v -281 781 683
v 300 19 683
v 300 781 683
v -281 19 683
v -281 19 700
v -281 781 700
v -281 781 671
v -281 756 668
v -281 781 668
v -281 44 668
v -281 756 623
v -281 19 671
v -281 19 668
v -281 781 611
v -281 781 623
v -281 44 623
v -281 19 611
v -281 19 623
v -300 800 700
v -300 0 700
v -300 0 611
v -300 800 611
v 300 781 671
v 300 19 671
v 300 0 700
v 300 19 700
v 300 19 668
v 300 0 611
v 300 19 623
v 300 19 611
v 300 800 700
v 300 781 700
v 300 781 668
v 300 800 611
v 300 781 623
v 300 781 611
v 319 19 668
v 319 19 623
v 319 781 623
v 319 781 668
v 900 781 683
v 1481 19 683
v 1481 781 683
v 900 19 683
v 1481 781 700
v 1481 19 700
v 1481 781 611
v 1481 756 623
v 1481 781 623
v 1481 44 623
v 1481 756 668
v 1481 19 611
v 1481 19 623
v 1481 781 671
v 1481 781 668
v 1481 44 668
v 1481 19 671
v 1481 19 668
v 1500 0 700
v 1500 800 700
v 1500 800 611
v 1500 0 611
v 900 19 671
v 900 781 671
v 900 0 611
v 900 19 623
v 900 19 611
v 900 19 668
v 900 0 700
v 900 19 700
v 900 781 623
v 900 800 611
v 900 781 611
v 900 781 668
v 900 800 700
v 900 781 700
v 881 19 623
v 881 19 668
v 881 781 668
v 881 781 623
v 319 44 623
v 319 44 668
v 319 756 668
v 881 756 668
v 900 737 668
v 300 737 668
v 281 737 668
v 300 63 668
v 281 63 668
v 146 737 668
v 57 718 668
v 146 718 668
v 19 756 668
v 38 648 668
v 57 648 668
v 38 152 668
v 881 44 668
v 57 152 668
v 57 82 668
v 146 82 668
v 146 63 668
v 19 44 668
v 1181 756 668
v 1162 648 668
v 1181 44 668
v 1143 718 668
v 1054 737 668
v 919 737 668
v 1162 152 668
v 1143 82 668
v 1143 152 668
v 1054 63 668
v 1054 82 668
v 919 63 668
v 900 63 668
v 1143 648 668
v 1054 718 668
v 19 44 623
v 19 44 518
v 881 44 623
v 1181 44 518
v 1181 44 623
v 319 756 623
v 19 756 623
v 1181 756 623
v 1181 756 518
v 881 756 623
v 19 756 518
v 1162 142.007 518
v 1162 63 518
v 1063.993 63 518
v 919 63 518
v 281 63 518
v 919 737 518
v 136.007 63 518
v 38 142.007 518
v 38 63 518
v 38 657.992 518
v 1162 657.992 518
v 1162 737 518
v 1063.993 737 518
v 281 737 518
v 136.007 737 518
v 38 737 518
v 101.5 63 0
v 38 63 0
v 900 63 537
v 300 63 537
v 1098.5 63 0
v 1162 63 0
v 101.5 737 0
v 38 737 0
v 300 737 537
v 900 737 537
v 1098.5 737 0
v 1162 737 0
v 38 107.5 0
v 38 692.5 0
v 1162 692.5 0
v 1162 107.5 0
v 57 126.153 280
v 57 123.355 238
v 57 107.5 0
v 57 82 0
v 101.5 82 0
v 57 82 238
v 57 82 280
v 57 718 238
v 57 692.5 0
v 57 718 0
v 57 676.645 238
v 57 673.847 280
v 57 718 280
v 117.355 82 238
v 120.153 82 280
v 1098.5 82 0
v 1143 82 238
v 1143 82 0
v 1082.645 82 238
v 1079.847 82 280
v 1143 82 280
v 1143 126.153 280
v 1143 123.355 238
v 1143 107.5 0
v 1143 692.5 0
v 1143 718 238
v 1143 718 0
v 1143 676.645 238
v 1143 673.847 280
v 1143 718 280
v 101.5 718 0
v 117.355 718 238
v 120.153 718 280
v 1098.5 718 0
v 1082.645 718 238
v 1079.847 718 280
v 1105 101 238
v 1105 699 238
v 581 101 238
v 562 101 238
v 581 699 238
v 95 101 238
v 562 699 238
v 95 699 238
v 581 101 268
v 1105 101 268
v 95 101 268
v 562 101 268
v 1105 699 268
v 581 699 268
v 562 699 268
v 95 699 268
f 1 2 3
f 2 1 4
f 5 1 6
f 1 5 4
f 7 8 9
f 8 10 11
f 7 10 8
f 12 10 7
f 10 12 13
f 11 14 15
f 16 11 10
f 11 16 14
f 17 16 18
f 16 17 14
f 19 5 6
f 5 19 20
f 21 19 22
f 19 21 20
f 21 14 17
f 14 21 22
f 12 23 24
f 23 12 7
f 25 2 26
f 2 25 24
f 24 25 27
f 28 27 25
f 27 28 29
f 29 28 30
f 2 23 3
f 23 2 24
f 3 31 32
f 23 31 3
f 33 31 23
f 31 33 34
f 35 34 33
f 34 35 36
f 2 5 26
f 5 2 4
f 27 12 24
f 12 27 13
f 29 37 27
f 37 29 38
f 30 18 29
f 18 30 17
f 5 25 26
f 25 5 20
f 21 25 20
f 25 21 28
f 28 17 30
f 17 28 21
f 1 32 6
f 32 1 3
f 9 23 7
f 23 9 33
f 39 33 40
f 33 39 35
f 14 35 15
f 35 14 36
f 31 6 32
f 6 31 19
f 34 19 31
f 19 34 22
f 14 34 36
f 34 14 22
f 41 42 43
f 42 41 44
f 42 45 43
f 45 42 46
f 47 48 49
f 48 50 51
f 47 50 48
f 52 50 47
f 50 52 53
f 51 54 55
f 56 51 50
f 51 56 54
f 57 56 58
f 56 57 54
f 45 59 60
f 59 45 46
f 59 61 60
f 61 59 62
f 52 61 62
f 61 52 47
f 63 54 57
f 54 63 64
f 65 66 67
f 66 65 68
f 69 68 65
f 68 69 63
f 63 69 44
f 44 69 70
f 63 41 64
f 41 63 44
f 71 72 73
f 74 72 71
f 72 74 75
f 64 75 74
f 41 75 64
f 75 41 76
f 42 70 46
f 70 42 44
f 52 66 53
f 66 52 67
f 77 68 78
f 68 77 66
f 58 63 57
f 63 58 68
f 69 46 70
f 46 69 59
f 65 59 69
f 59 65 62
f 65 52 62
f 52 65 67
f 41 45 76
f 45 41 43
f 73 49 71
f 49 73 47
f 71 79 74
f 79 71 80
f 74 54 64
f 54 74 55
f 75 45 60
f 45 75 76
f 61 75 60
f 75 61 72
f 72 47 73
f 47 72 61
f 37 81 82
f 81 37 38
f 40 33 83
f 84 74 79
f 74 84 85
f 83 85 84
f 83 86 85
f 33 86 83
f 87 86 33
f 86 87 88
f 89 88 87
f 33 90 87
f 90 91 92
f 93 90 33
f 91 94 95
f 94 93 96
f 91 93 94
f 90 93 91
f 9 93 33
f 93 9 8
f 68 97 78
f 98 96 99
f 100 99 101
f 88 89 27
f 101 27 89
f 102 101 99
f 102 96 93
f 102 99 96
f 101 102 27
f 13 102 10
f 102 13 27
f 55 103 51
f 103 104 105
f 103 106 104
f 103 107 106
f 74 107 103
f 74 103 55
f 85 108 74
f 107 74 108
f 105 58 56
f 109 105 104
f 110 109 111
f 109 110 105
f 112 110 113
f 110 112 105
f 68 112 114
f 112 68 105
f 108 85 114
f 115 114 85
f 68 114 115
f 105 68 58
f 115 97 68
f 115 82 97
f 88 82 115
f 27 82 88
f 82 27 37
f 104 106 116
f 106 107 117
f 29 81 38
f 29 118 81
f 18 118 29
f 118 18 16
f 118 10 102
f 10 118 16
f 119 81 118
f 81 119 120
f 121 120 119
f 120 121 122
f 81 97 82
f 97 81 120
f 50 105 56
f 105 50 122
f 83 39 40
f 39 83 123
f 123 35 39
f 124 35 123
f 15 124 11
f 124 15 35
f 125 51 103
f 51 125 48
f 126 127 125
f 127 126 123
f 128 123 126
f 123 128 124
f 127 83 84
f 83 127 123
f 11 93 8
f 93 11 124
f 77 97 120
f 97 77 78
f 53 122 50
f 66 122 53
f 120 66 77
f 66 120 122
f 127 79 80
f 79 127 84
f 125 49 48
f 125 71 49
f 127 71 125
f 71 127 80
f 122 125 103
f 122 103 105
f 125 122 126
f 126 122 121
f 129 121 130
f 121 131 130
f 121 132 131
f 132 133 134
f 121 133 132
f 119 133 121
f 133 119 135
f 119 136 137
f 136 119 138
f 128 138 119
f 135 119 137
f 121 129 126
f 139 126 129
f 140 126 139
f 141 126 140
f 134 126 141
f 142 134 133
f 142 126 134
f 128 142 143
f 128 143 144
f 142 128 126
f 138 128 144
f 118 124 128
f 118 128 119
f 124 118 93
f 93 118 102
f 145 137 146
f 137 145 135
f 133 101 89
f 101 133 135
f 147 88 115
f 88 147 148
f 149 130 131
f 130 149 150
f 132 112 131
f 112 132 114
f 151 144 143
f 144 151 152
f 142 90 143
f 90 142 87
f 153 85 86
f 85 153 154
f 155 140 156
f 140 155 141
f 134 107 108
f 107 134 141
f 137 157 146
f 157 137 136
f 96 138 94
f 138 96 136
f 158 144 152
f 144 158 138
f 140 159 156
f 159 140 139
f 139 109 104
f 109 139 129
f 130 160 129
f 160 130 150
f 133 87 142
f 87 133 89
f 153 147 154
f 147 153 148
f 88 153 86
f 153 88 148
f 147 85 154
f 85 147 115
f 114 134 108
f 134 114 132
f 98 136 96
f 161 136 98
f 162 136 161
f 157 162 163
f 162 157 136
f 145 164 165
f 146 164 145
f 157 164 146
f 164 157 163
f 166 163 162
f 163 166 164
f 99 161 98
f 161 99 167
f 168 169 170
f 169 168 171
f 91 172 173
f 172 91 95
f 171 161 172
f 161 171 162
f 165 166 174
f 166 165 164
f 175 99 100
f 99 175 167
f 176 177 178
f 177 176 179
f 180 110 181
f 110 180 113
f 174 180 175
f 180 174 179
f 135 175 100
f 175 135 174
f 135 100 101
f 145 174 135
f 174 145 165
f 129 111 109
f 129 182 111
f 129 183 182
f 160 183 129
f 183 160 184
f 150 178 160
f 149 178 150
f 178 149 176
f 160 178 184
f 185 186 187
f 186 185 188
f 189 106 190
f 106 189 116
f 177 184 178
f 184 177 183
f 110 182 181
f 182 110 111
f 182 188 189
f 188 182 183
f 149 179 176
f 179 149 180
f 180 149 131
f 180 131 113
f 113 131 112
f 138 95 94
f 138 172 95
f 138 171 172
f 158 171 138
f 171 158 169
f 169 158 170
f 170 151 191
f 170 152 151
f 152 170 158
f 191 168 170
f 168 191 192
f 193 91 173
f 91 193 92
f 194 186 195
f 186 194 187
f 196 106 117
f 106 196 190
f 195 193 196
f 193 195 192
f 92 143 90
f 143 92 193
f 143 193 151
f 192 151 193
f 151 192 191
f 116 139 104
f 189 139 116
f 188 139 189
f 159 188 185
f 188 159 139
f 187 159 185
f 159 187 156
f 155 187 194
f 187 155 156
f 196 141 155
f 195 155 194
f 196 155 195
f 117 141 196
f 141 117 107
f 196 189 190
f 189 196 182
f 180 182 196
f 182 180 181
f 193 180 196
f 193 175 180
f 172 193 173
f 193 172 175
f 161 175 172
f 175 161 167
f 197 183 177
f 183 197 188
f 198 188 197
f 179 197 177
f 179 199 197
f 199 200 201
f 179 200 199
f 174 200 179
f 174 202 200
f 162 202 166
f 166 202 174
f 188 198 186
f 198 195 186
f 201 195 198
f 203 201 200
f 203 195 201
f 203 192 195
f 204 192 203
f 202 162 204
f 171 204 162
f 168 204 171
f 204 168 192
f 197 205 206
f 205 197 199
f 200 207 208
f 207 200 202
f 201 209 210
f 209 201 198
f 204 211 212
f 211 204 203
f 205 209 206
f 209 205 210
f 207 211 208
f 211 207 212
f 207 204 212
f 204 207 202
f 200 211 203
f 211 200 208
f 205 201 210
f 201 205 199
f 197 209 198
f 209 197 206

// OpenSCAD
overallWidth = 800;
overallLength =  1200;
overallHeight = 700;

legWidth = 89;
legThickness = 19;

tableHeight = 89;
tableEdge = 19;

tableSurfaceThickness = 12;

tableDadoDepth = 4;
tableSurfaceOffset = 60;

slideCurrentExtension = 500;
slideMaxExtension = 300;
slideGap = 3;
slideLength = 300;
slideWidth = 45;
slideThickness = 25;


wellDepth = 150;
wellThickness = 19;

shelfThickness = 12;
shelfDepth = 42;
shelfSupportThickness = 19;

includeBottomShelf = false;

assembly();

module assembly() {
    addHeader();
    
    translate([0,0,overallHeight - tableHeight]) {
        table();
    }
    
    // Well
    wellOffset = overallHeight - tableHeight - wellDepth + tableSurfaceOffset - slideGap;
    
    translate([tableEdge, tableEdge + slideThickness, wellOffset]) {
        well();
    }
    
    // Front Left
    translate([tableEdge+wellThickness,tableEdge + slideThickness+wellThickness,0]) {
        mirror([0,0,0]) {
            rotate([0,0,0]) {
                leg();
            }
        }
    }
    
    // Front Right
    translate([overallLength-(tableEdge+wellThickness),tableEdge + slideThickness+wellThickness,0]) {
        mirror([1,0,0]){
            rotate([0,0,0]) {
                leg();
            }
        }
    }
    
    // Rear Left
    translate([tableEdge+wellThickness,overallWidth-(tableEdge + slideThickness+wellThickness),0]) {
        mirror([1,0,0]) {
            rotate([0,0,180]) {
                leg();
            }
        }
    }
    
    // Rear Right
    translate([overallLength-(tableEdge+wellThickness),overallWidth-(tableEdge + slideThickness+wellThickness),0]) {
        mirror([0,0,0]){
            rotate([0,0,180]) {
                leg();
            }
        }
    }
    
    // Common offset for shelf placement
    translate([tableEdge + wellThickness+legThickness, tableEdge + slideThickness + wellThickness + legThickness, 0]) {
        if(includeBottomShelf) {
            // Bottom Shelf
            shelf();
            
            // middle Shelf
            shelfOffset = (wellOffset -  shelfDepth) / 2;
            translate([0,0,wellOffset/2]) {
                shelf();
            }
        }
        else {
            // Shelf
            translate([0,0, (wellOffset -  shelfDepth) / 2]) {
                shelf();
            }
        }
    }
}
module table() {
    
    pos = max(0, min(slideMaxExtension, slideCurrentExtension));
    
    // Left Surface
    translate([-pos, 0, 0]) {
        tableLeft();
    }
    
    // Right Surface
    translate([overallLength/2 + pos, 0, 0]) {
        tableRight();
    }
    
    translate([tableEdge,tableEdge,tableSurfaceOffset - slideWidth - slideGap]) {
        slide(pos);
    }
    
    translate([tableEdge,overallWidth-tableEdge-slideThickness,tableSurfaceOffset - slideWidth - slideGap]) {
        slide(pos);
    }
    
    
    
    
    translate([(overallLength - tableEdge),tableEdge,tableSurfaceOffset - slideGap]) {
        rotate([0,180,0])
        slide(pos);
    }
    
    translate([(overallLength - tableEdge),overallWidth-tableEdge-slideThickness,tableSurfaceOffset - slideGap]) {
        rotate([0,180,0])
        slide(pos);
    }

}
module shelf() {
    shelfWidth = overallWidth - 2*tableEdge-2*slideThickness-2*wellThickness-2*legThickness;
    shelfLength = overallLength - 2*tableEdge-2*wellThickness-2*legThickness;
    
    shelfInnerWidth = shelfWidth - 2*shelfSupportThickness;
    
    // Front
    translate([0, 0, 0]) {
        addPart("Shelf Edge", shelfLength, shelfDepth, shelfSupportThickness);
        cube([shelfLength, shelfSupportThickness, shelfDepth]);
    }
    
    // Back
    translate([0,shelfWidth - shelfSupportThickness,0]) {
        addPart("Shelf Edge", shelfLength, shelfDepth, shelfSupportThickness);
        cube([shelfLength, shelfSupportThickness, shelfDepth]);
    }
    
    // Outer Left
    translate([shelfSupportThickness, shelfSupportThickness,0]) {
        rotate([0, 0, 90]) {
            addPart("Shelf Edge", shelfInnerWidth, shelfDepth, shelfSupportThickness);
            cube([shelfInnerWidth, shelfSupportThickness, shelfDepth]);
        }
    }
    
    // Inner Left
    translate([2*shelfSupportThickness, shelfSupportThickness,0]) {
        rotate([0, 0, 90]) {
            addPart("Shelf Support", shelfInnerWidth, shelfDepth-shelfThickness, shelfSupportThickness);
            cube([shelfInnerWidth, shelfSupportThickness, shelfDepth-shelfThickness]);
        }
    }
    
    //centre
    translate([(shelfLength - 2*shelfSupportThickness) / 2, shelfSupportThickness,0]) {
        rotate([0, 0, 90]) {
            addPart("Shelf Support", shelfInnerWidth, shelfDepth-shelfThickness, shelfSupportThickness);
            cube([shelfInnerWidth, shelfSupportThickness, shelfDepth-shelfThickness]);
        }
    }
    
    // Inner Right
    translate([shelfLength - shelfSupportThickness, shelfSupportThickness,0]) {
        rotate([0, 0, 90]) {
            addPart("Shelf Support", shelfInnerWidth, shelfDepth-shelfThickness, shelfSupportThickness);
            cube([shelfInnerWidth, shelfSupportThickness, shelfDepth-shelfThickness]);
        }
    }
    
    // Outer Right
    translate([shelfLength, shelfSupportThickness,0]) {
        rotate([0, 0, 90]) {
            addPart("Shelf Edge", shelfInnerWidth, shelfDepth, shelfSupportThickness);
            cube([shelfInnerWidth, shelfSupportThickness, shelfDepth]);
        }
    }
    
    // Sheet
    translate([shelfSupportThickness,shelfSupportThickness,shelfDepth-shelfThickness]) {
        addPart("Shelf", shelfLength  - 2*shelfSupportThickness, shelfInnerWidth, shelfSupportThickness);
        cube([shelfLength  - 2*shelfSupportThickness, shelfInnerWidth, shelfThickness]);
    }
}
module well() {
    wellWidth = overallWidth - 2*tableEdge-2*slideThickness;
    wellLength = overallLength - 2*tableEdge;
    
    wellInnerWidth = wellWidth - 2*wellThickness;
    
    //Front
    translate([0, 0, 0]) {
        cube([wellLength, wellThickness, wellDepth]);
        addPart("Well Side", wellLength, wellDepth, wellThickness);
    }
    
    // Back
    translate([0, wellWidth-wellThickness, 0]) {
        addPart("Well Side", wellLength, wellDepth, wellThickness);
        cube([wellLength, wellThickness, wellDepth]);
    }
    
    // Left
    translate([wellThickness, wellThickness, 0]) {
        rotate([0,0,90]) {
            addPart("Well Side", wellInnerWidth, wellDepth, wellThickness);
            cube([wellInnerWidth, wellThickness, wellDepth]);
        }
    }
    
    // Right
    translate([wellLength, wellThickness, 0]) {
        rotate([0,0,90]) {
            addPart("Well Side", wellInnerWidth, wellDepth, wellThickness);
            cube([wellInnerWidth, wellThickness, wellDepth]);
        }
    }
    
    
    
    // Left Buffer
    translate([slideMaxExtension-tableEdge, wellThickness, wellThickness]) {
        rotate([0,0,90]) {
            addPart("Well Buffer", wellInnerWidth, wellDepth-wellThickness, wellThickness);
            cube([wellInnerWidth, wellThickness, wellDepth-wellThickness]);
        }
    }
    
    // Right Buffer
    translate([slideMaxExtension-tableEdge + 2*slideMaxExtension + wellThickness, wellThickness, wellThickness]) {
        rotate([0,0,90]) {
            addPart("Well Buffer", wellInnerWidth, wellDepth-wellThickness, wellThickness);
            cube([wellInnerWidth, wellThickness, wellDepth-wellThickness]);
        }
    }
    
    
    // Well Bottom
    translate([slideMaxExtension-tableEdge-wellThickness, wellThickness, 0]) {
        rotate([90,0,90]) {
            addPart("Well Base", wellInnerWidth, 2*slideMaxExtension + 2*wellThickness, wellThickness);
            cube([wellInnerWidth, wellThickness, 2*slideMaxExtension + 2*wellThickness]);
        }
    }
}

module slide(extension = 0) {
    color("gray")
    translate([-extension, 0, 0])
    cube([slideLength + extension, slideThickness, slideWidth]);
}

module tableSurface() {
    
    width = overallWidth - (2*tableEdge) + 2*(tableDadoDepth);
    length = overallLength/2 - tableEdge + tableDadoDepth;
    
    addPart("Table Surface", length, width, tableSurfaceThickness);
    
    color("white")
    linear_extrude(tableSurfaceThickness) {
        square([length, width]);
    }
}

module tableLeft() {
    // Left
    translate([tableEdge,0,0]) {
        rotate([0,0,90]) {
            tableSidePiece(overallWidth);
        }
    }

    // Left Front
    translate([overallLength/2,tableEdge,0]) {
        rotate([0,0,180]) {
            tableSidePiece(overallLength/2, 0, 1);
        }
    }

    // Left Rear
    translate([0,overallWidth-tableEdge,0]) {
        rotate([0,0,0]) {
            tableSidePiece(overallLength/2, 1, 0);
        }
    }
    
    translate([tableEdge-tableDadoDepth,tableEdge-tableDadoDepth,tableSurfaceOffset]) {
        tableSurface();
    }
}

module tableRight() {
    // right
    translate([overallLength/2-tableEdge,overallWidth,0]) {
        rotate([0,0,-90]) {
            tableSidePiece(overallWidth);
        }
    }

    // Right Front
    translate([overallLength/2,tableEdge,0]) {
        rotate([0,0,180]) {
            tableSidePiece(overallLength/2, 1, 0);
        }
    }

    // Right Rear
    translate([0,overallWidth-tableEdge,0]) {
        rotate([0,0,0]) {
            tableSidePiece(overallLength/2, 0, 1);
        }
    }
    
    translate([0,tableEdge-tableDadoDepth,tableSurfaceOffset]) {
        tableSurface();
    }
}

module tableSidePiece(length, mitreLeft = true, mitreRight = true) {
    color("yellow")
    translate([length,tableEdge,tableHeight])
    rotate([180,90,0])
    difference() {
        linear_extrude(length) {
            tableProfile();
        }
        
        addPart("Table Edge", tableHeight, tableEdge, length);
        
        if(mitreLeft) {
            // mitre ends
            translate([tableHeight, tableEdge, length]) {
                rotate([90,90,-90]) {
                    linear_extrude(tableHeight) {
                        polygon([
                            [0, 0],
                            [tableEdge, 0],
                            [0, tableEdge]
                        ]);
                    }
                }
            }
        }
            
        if(mitreRight) {
        // mitre ends
            translate([0, tableEdge, 0]) {
                rotate([90,-90,90]) {
                    linear_extrude(tableHeight) {
                        polygon([
                            [0, 0],
                            [tableEdge, 0],
                            [0, tableEdge]
                        ]);
                    }
                }
            }
        }
    }
}

module tableProfile() {
    polygon([
        [0,                 0],
        [0,                 tableEdge],
        [tableHeight-tableSurfaceOffset,       tableEdge],
        [tableHeight-tableSurfaceOffset,       tableEdge-tableDadoDepth],
        [tableHeight-tableSurfaceOffset-tableSurfaceThickness,       tableEdge-tableDadoDepth],
        [tableHeight-tableSurfaceOffset-tableSurfaceThickness,       tableEdge],
        [tableHeight,       tableEdge],
        [tableHeight,       0]
    ]);
}

module leg() {
    rotate([90, 0, 90]) {
        legPart();
    }

    translate([legThickness, legThickness, 0])
    rotate([90, 0, 0]) {
        legPart();
    }
}

module legPart() {
    
    h=overallHeight - tableHeight + tableSurfaceOffset - slideGap;
    
    addPart("Leg", h, legWidth, legThickness);
    
    linear_extrude(legThickness) {
        polygon([
            [0,     0],
            [legWidth/2,   0],
            [legWidth,     h],
            [0,     h]
        ]);
    }
}

module addHeader() {
    // Type, Name, Width, Height, Depth, Description)
    echo("Type,Label,Width,Height,Depth,Description");
}

module addPart(label, width, height, depth, description="") {
    // Type, Name, Width, Height, Depth, Description)
    echo(str("PART,", label, ",",width,",",height,",",depth,",",description));
}

module addInfo(label, description="", width="", height="", depth="") {
    // Type, Name, Width, Height, Depth, Description)
    echo(str("INFO,", label, ",",width,",",height,",",depth,",",description));
}
